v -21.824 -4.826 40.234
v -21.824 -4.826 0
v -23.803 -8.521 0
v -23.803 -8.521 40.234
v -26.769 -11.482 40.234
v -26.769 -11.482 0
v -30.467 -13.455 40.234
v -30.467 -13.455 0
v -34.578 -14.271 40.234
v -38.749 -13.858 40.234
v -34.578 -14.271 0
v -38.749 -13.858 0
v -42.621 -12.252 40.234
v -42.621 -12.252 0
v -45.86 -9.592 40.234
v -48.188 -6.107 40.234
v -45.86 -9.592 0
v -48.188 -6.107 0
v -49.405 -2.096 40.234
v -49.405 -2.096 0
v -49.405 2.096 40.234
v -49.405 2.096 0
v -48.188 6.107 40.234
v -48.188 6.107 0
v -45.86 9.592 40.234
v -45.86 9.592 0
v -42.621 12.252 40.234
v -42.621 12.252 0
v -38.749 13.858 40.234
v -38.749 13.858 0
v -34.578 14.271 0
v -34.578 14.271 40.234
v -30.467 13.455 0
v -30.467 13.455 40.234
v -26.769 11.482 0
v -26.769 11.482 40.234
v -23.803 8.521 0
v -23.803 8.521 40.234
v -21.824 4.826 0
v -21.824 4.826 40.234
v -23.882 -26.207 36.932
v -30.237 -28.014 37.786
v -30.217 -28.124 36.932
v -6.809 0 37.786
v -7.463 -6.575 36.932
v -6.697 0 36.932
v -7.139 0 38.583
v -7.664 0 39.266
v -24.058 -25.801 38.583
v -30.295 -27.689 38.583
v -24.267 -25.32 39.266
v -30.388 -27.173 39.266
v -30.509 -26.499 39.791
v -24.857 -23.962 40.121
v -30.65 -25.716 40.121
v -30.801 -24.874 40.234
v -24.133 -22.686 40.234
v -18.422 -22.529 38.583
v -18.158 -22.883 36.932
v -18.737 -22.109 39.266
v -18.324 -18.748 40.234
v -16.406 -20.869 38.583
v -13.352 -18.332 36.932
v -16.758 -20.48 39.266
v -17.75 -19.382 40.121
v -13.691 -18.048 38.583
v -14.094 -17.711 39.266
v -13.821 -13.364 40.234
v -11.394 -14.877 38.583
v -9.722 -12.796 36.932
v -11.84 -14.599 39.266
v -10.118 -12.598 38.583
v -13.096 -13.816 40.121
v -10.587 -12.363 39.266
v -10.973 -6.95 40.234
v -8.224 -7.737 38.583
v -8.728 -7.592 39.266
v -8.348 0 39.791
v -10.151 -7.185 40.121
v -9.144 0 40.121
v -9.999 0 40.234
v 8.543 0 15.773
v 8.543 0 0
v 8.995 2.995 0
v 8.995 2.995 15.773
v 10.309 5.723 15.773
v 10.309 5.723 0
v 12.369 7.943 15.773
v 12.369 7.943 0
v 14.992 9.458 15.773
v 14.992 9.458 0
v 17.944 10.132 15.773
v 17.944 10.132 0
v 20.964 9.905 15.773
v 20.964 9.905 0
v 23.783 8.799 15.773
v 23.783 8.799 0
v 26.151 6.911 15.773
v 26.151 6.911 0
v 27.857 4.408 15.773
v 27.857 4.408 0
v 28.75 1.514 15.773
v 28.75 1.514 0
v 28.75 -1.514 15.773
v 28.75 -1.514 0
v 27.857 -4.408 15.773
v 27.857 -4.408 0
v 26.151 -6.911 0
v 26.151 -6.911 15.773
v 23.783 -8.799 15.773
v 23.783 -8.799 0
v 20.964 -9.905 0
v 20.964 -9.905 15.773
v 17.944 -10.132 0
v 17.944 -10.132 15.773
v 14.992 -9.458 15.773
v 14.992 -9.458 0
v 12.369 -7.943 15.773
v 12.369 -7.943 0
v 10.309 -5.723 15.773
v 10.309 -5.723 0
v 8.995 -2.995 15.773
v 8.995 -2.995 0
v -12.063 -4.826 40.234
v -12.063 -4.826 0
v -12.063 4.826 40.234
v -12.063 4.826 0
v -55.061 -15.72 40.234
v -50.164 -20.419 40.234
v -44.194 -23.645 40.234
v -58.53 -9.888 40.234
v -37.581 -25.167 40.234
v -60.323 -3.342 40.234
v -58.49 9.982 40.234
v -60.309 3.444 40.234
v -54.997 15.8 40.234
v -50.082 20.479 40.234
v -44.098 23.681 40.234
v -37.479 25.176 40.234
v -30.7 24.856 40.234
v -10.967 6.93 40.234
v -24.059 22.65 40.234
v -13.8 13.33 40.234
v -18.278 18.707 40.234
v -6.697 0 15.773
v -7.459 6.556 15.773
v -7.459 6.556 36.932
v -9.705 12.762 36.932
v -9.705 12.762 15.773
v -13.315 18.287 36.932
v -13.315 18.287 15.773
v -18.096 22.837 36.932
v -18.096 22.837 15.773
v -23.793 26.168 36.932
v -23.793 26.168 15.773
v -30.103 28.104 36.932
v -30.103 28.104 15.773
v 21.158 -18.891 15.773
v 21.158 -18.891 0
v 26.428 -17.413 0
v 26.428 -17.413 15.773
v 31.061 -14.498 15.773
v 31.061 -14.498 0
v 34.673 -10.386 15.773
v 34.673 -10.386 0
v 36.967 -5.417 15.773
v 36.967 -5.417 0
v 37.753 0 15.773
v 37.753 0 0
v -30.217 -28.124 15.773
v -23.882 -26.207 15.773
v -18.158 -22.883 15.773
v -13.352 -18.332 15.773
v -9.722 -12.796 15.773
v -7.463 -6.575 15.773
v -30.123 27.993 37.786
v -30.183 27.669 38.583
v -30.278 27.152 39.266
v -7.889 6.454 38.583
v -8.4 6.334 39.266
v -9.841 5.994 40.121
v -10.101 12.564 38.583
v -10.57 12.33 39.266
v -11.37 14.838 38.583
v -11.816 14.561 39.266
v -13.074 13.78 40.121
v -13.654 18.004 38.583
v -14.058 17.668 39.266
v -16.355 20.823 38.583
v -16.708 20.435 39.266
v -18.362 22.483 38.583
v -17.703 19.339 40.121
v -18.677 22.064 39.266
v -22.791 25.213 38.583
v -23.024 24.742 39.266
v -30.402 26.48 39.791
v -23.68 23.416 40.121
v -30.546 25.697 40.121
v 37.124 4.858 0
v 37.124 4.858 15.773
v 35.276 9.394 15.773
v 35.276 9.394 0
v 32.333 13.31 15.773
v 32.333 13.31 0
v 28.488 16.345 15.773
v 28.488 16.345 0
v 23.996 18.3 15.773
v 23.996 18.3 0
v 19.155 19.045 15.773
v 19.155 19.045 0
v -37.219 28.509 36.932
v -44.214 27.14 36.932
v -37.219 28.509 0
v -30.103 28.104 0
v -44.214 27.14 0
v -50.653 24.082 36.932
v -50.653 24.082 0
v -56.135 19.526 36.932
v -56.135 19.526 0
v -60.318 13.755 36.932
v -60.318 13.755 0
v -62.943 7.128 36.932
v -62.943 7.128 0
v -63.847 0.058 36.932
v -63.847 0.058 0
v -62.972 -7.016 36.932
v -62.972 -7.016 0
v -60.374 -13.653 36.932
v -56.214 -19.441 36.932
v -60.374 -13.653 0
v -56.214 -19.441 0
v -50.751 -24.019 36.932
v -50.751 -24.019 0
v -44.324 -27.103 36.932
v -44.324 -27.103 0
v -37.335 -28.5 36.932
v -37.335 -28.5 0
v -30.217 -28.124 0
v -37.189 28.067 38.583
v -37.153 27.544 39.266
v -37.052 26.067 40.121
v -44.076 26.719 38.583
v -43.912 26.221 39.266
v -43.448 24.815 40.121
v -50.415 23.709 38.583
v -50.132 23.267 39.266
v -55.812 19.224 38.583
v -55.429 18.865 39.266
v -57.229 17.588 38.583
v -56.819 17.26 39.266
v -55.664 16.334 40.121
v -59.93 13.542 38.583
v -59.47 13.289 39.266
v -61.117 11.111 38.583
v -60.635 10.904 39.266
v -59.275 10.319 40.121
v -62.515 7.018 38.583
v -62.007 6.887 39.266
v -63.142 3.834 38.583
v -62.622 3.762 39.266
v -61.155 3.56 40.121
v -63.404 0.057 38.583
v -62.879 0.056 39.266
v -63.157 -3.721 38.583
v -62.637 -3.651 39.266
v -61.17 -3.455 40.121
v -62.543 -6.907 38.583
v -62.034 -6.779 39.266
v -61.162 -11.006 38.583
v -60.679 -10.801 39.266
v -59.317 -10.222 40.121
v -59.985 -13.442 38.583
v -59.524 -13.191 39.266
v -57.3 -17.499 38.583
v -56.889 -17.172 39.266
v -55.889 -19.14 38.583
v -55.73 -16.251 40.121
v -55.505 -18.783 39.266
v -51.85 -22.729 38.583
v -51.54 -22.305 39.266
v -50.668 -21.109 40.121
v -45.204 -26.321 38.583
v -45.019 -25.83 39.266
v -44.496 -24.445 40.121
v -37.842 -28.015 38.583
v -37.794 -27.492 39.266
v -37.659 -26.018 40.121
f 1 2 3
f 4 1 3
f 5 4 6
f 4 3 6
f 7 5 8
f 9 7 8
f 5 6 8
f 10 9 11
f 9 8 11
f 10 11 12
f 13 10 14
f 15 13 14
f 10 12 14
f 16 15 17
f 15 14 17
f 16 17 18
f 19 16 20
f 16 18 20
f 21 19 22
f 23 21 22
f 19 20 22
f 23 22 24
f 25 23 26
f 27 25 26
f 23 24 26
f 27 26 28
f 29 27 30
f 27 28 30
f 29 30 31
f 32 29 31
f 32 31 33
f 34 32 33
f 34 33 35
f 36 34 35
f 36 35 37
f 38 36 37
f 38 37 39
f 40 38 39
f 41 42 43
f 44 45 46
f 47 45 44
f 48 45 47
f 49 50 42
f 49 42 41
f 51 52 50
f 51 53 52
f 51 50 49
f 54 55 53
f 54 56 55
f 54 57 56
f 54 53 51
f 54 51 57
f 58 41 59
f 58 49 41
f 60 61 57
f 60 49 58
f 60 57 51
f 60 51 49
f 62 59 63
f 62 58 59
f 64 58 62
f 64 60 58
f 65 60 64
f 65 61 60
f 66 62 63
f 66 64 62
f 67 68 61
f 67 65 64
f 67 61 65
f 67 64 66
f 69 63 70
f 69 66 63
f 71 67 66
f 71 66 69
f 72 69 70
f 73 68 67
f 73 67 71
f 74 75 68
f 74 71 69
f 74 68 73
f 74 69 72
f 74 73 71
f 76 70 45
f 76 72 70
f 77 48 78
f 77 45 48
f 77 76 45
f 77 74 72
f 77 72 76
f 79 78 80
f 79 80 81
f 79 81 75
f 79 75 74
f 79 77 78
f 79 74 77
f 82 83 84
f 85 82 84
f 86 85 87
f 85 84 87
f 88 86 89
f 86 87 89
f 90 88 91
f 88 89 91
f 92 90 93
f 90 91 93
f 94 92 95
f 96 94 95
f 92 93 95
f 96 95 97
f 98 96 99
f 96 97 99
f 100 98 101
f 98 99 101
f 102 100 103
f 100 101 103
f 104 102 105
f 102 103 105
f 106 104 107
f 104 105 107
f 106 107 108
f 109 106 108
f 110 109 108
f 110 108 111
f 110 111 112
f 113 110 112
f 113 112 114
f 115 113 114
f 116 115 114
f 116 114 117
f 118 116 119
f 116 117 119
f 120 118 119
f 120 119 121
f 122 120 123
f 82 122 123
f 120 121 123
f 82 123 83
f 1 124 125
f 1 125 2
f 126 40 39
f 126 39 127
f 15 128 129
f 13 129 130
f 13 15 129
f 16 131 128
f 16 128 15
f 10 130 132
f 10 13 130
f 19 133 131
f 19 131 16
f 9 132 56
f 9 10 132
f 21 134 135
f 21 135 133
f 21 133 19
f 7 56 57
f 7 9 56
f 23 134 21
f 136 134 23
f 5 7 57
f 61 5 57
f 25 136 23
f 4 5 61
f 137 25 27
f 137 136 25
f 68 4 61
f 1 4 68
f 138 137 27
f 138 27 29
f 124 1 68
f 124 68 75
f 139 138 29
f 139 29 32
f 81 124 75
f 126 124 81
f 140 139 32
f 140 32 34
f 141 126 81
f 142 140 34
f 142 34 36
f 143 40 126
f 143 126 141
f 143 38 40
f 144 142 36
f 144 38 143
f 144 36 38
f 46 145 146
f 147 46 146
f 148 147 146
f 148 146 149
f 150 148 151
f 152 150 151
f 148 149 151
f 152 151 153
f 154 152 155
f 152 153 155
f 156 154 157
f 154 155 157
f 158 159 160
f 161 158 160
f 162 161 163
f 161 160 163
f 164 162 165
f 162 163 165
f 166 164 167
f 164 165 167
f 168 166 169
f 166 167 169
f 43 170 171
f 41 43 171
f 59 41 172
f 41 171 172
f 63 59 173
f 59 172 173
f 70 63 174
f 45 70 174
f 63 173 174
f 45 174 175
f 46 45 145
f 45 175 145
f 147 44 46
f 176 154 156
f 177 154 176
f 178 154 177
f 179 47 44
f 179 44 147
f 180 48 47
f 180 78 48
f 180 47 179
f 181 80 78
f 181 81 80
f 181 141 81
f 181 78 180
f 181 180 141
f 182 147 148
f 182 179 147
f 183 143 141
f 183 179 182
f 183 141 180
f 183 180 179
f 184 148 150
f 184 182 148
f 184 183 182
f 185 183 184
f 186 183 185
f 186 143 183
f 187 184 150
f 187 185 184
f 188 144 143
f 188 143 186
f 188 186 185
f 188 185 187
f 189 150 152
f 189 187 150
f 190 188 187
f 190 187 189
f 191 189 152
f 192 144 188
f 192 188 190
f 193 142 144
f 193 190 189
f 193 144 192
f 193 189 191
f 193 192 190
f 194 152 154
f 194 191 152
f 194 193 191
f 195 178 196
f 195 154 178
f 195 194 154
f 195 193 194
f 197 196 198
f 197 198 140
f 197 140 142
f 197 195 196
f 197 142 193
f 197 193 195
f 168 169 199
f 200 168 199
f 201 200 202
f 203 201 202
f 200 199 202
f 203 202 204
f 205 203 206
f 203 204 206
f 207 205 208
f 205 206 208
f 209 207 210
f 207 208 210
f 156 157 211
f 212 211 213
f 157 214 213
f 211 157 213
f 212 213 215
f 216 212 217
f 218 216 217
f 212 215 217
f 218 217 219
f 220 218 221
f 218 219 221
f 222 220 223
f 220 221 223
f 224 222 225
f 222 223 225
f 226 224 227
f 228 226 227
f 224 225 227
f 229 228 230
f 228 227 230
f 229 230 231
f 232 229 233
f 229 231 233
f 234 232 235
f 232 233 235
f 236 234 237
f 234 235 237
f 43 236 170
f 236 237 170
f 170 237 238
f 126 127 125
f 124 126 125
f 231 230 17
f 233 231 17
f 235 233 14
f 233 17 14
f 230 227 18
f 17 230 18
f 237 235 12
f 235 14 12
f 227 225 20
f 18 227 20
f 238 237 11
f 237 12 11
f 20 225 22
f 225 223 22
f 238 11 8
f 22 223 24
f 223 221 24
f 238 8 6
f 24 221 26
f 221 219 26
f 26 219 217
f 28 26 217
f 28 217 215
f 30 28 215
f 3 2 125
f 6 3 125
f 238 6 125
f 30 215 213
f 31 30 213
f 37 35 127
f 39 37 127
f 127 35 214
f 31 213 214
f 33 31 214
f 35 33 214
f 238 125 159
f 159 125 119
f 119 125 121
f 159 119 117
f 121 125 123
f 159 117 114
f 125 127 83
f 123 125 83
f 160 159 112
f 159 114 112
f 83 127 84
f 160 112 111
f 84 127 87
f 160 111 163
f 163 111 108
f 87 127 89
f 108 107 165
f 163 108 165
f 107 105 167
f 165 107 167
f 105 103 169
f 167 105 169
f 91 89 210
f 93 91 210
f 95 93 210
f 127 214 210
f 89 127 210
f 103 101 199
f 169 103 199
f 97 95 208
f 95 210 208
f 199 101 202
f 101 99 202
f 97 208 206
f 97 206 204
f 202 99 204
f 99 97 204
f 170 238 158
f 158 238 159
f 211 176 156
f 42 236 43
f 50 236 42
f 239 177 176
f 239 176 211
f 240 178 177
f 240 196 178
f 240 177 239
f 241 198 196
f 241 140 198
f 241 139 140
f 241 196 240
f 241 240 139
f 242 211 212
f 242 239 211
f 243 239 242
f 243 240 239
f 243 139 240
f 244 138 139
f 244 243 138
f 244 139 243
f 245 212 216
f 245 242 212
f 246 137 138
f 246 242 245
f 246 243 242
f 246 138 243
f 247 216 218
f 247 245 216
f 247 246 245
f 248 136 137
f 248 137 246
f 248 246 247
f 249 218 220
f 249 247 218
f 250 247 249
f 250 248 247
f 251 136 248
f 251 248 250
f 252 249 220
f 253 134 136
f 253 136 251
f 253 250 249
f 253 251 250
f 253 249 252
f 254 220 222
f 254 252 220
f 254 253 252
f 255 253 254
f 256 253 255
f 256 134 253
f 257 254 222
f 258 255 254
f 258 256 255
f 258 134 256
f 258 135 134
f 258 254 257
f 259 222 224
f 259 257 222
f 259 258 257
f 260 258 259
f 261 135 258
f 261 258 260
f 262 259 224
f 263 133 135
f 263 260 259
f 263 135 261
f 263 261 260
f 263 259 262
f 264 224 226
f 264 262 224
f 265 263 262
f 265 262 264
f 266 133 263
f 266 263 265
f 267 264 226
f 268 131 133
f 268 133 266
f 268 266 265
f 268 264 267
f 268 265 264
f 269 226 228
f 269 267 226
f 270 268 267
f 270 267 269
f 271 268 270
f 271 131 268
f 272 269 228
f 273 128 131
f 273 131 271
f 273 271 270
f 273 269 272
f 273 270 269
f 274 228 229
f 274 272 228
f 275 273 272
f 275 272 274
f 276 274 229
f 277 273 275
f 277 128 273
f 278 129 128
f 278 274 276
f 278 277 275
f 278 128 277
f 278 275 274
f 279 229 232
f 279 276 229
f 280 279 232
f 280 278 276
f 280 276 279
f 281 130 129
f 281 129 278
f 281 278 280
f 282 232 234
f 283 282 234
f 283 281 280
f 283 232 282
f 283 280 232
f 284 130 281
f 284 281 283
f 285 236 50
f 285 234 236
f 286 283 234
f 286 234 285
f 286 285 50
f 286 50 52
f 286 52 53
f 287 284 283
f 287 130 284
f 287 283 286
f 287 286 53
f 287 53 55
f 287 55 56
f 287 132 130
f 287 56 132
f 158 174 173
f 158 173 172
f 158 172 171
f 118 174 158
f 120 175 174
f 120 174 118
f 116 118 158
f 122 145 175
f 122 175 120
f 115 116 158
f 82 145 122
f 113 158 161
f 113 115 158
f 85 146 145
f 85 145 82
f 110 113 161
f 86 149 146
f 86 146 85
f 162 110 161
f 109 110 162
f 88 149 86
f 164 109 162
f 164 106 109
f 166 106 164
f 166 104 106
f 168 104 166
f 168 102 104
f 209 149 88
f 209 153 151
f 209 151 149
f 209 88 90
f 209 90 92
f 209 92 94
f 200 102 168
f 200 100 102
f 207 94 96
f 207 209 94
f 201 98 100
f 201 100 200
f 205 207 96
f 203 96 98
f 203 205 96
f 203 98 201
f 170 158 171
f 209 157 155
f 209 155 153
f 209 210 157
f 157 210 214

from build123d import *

# Parameters (mm, degrees)
F1_DEPTH = 40.2336
F2_DEPTH = 15.7734
F3_R     = 3.302


with BuildPart() as f1:
    # F0 (on Top) → F1 (new body)
    with BuildSketch(Plane.XY):
        with BuildLine():
            ThreePointArc((-30.217025, -28.124403), (-13.351678, -18.33162), (-6.696585, 0))
            ThreePointArc((-6.696585, 0), (-13.314561, 18.287146), (-30.103039, 28.103679))
            ThreePointArc((-30.103039, 28.103679), (-63.846526, 0.057927), (-30.217025, -28.124403))
        make_face()
        with BuildLine():
            Line((-12.062577, 4.826), (-12.062577, 0))
            Line((-12.062577, 0), (-12.062577, -4.826))
            Line((-12.062577, -4.826), (-21.82382, -4.826))
            ThreePointArc((-21.82382, -4.826), (-49.559085, 0), (-21.82382, 4.826))
            Line((-21.82382, 4.826), (-12.062577, 4.826))
        make_face(mode=Mode.SUBTRACT)
    extrude(amount=F1_DEPTH)

    # F0 (on Top) → F2 (join)
    with BuildSketch(Plane.XY):
        with BuildLine():
            Line((-0.346585, 0), (-6.696585, 0))
            ThreePointArc((-6.696585, 0), (-13.351678, -18.33162), (-30.217025, -28.124403))
            Line((-30.217025, -28.124403), (21.158081, -18.891191))
            ThreePointArc((21.158081, -18.891191), (6.130804, -14.311951), (-0.346585, 0))
        make_face()
        with BuildLine():
            ThreePointArc((-30.103039, 28.103679), (-13.314561, 18.287146), (-6.696585, 0))
            Line((-6.696585, 0), (-0.346585, 0))
            ThreePointArc((-0.346585, 0), (5.393624, 13.629085), (19.154934, 19.044648))
            Line((19.154934, 19.044648), (-30.103039, 28.103679))
        make_face()
        with BuildLine():
            ThreePointArc((19.154934, 19.044648), (5.393624, 13.629085), (-0.346585, 0))
            ThreePointArc((-0.346585, 0), (6.130804, -14.311951), (21.158081, -18.891191))
            ThreePointArc((21.158081, -18.891191), (33.015366, -12.572611), (37.753415, 0))
            ThreePointArc((37.753415, 0), (32.3325, 13.309791), (19.154934, 19.044648))
        make_face()
        with BuildLine():
            ThreePointArc((28.863415, 0), (18.703415, -10.16), (8.543415, 0))
            ThreePointArc((8.543415, 0), (18.703415, 10.16), (28.863415, 0))
        make_face(mode=Mode.SUBTRACT)
    extrude(amount=F2_DEPTH)

    # F3
    f3_edges = [f1.edges().sort_by_distance(p)[0] for p in [
        (-40.326145, 28.124403, 40.2336),
    ]]
    fillet(f3_edges, radius=F3_R)


solid = f1.part
